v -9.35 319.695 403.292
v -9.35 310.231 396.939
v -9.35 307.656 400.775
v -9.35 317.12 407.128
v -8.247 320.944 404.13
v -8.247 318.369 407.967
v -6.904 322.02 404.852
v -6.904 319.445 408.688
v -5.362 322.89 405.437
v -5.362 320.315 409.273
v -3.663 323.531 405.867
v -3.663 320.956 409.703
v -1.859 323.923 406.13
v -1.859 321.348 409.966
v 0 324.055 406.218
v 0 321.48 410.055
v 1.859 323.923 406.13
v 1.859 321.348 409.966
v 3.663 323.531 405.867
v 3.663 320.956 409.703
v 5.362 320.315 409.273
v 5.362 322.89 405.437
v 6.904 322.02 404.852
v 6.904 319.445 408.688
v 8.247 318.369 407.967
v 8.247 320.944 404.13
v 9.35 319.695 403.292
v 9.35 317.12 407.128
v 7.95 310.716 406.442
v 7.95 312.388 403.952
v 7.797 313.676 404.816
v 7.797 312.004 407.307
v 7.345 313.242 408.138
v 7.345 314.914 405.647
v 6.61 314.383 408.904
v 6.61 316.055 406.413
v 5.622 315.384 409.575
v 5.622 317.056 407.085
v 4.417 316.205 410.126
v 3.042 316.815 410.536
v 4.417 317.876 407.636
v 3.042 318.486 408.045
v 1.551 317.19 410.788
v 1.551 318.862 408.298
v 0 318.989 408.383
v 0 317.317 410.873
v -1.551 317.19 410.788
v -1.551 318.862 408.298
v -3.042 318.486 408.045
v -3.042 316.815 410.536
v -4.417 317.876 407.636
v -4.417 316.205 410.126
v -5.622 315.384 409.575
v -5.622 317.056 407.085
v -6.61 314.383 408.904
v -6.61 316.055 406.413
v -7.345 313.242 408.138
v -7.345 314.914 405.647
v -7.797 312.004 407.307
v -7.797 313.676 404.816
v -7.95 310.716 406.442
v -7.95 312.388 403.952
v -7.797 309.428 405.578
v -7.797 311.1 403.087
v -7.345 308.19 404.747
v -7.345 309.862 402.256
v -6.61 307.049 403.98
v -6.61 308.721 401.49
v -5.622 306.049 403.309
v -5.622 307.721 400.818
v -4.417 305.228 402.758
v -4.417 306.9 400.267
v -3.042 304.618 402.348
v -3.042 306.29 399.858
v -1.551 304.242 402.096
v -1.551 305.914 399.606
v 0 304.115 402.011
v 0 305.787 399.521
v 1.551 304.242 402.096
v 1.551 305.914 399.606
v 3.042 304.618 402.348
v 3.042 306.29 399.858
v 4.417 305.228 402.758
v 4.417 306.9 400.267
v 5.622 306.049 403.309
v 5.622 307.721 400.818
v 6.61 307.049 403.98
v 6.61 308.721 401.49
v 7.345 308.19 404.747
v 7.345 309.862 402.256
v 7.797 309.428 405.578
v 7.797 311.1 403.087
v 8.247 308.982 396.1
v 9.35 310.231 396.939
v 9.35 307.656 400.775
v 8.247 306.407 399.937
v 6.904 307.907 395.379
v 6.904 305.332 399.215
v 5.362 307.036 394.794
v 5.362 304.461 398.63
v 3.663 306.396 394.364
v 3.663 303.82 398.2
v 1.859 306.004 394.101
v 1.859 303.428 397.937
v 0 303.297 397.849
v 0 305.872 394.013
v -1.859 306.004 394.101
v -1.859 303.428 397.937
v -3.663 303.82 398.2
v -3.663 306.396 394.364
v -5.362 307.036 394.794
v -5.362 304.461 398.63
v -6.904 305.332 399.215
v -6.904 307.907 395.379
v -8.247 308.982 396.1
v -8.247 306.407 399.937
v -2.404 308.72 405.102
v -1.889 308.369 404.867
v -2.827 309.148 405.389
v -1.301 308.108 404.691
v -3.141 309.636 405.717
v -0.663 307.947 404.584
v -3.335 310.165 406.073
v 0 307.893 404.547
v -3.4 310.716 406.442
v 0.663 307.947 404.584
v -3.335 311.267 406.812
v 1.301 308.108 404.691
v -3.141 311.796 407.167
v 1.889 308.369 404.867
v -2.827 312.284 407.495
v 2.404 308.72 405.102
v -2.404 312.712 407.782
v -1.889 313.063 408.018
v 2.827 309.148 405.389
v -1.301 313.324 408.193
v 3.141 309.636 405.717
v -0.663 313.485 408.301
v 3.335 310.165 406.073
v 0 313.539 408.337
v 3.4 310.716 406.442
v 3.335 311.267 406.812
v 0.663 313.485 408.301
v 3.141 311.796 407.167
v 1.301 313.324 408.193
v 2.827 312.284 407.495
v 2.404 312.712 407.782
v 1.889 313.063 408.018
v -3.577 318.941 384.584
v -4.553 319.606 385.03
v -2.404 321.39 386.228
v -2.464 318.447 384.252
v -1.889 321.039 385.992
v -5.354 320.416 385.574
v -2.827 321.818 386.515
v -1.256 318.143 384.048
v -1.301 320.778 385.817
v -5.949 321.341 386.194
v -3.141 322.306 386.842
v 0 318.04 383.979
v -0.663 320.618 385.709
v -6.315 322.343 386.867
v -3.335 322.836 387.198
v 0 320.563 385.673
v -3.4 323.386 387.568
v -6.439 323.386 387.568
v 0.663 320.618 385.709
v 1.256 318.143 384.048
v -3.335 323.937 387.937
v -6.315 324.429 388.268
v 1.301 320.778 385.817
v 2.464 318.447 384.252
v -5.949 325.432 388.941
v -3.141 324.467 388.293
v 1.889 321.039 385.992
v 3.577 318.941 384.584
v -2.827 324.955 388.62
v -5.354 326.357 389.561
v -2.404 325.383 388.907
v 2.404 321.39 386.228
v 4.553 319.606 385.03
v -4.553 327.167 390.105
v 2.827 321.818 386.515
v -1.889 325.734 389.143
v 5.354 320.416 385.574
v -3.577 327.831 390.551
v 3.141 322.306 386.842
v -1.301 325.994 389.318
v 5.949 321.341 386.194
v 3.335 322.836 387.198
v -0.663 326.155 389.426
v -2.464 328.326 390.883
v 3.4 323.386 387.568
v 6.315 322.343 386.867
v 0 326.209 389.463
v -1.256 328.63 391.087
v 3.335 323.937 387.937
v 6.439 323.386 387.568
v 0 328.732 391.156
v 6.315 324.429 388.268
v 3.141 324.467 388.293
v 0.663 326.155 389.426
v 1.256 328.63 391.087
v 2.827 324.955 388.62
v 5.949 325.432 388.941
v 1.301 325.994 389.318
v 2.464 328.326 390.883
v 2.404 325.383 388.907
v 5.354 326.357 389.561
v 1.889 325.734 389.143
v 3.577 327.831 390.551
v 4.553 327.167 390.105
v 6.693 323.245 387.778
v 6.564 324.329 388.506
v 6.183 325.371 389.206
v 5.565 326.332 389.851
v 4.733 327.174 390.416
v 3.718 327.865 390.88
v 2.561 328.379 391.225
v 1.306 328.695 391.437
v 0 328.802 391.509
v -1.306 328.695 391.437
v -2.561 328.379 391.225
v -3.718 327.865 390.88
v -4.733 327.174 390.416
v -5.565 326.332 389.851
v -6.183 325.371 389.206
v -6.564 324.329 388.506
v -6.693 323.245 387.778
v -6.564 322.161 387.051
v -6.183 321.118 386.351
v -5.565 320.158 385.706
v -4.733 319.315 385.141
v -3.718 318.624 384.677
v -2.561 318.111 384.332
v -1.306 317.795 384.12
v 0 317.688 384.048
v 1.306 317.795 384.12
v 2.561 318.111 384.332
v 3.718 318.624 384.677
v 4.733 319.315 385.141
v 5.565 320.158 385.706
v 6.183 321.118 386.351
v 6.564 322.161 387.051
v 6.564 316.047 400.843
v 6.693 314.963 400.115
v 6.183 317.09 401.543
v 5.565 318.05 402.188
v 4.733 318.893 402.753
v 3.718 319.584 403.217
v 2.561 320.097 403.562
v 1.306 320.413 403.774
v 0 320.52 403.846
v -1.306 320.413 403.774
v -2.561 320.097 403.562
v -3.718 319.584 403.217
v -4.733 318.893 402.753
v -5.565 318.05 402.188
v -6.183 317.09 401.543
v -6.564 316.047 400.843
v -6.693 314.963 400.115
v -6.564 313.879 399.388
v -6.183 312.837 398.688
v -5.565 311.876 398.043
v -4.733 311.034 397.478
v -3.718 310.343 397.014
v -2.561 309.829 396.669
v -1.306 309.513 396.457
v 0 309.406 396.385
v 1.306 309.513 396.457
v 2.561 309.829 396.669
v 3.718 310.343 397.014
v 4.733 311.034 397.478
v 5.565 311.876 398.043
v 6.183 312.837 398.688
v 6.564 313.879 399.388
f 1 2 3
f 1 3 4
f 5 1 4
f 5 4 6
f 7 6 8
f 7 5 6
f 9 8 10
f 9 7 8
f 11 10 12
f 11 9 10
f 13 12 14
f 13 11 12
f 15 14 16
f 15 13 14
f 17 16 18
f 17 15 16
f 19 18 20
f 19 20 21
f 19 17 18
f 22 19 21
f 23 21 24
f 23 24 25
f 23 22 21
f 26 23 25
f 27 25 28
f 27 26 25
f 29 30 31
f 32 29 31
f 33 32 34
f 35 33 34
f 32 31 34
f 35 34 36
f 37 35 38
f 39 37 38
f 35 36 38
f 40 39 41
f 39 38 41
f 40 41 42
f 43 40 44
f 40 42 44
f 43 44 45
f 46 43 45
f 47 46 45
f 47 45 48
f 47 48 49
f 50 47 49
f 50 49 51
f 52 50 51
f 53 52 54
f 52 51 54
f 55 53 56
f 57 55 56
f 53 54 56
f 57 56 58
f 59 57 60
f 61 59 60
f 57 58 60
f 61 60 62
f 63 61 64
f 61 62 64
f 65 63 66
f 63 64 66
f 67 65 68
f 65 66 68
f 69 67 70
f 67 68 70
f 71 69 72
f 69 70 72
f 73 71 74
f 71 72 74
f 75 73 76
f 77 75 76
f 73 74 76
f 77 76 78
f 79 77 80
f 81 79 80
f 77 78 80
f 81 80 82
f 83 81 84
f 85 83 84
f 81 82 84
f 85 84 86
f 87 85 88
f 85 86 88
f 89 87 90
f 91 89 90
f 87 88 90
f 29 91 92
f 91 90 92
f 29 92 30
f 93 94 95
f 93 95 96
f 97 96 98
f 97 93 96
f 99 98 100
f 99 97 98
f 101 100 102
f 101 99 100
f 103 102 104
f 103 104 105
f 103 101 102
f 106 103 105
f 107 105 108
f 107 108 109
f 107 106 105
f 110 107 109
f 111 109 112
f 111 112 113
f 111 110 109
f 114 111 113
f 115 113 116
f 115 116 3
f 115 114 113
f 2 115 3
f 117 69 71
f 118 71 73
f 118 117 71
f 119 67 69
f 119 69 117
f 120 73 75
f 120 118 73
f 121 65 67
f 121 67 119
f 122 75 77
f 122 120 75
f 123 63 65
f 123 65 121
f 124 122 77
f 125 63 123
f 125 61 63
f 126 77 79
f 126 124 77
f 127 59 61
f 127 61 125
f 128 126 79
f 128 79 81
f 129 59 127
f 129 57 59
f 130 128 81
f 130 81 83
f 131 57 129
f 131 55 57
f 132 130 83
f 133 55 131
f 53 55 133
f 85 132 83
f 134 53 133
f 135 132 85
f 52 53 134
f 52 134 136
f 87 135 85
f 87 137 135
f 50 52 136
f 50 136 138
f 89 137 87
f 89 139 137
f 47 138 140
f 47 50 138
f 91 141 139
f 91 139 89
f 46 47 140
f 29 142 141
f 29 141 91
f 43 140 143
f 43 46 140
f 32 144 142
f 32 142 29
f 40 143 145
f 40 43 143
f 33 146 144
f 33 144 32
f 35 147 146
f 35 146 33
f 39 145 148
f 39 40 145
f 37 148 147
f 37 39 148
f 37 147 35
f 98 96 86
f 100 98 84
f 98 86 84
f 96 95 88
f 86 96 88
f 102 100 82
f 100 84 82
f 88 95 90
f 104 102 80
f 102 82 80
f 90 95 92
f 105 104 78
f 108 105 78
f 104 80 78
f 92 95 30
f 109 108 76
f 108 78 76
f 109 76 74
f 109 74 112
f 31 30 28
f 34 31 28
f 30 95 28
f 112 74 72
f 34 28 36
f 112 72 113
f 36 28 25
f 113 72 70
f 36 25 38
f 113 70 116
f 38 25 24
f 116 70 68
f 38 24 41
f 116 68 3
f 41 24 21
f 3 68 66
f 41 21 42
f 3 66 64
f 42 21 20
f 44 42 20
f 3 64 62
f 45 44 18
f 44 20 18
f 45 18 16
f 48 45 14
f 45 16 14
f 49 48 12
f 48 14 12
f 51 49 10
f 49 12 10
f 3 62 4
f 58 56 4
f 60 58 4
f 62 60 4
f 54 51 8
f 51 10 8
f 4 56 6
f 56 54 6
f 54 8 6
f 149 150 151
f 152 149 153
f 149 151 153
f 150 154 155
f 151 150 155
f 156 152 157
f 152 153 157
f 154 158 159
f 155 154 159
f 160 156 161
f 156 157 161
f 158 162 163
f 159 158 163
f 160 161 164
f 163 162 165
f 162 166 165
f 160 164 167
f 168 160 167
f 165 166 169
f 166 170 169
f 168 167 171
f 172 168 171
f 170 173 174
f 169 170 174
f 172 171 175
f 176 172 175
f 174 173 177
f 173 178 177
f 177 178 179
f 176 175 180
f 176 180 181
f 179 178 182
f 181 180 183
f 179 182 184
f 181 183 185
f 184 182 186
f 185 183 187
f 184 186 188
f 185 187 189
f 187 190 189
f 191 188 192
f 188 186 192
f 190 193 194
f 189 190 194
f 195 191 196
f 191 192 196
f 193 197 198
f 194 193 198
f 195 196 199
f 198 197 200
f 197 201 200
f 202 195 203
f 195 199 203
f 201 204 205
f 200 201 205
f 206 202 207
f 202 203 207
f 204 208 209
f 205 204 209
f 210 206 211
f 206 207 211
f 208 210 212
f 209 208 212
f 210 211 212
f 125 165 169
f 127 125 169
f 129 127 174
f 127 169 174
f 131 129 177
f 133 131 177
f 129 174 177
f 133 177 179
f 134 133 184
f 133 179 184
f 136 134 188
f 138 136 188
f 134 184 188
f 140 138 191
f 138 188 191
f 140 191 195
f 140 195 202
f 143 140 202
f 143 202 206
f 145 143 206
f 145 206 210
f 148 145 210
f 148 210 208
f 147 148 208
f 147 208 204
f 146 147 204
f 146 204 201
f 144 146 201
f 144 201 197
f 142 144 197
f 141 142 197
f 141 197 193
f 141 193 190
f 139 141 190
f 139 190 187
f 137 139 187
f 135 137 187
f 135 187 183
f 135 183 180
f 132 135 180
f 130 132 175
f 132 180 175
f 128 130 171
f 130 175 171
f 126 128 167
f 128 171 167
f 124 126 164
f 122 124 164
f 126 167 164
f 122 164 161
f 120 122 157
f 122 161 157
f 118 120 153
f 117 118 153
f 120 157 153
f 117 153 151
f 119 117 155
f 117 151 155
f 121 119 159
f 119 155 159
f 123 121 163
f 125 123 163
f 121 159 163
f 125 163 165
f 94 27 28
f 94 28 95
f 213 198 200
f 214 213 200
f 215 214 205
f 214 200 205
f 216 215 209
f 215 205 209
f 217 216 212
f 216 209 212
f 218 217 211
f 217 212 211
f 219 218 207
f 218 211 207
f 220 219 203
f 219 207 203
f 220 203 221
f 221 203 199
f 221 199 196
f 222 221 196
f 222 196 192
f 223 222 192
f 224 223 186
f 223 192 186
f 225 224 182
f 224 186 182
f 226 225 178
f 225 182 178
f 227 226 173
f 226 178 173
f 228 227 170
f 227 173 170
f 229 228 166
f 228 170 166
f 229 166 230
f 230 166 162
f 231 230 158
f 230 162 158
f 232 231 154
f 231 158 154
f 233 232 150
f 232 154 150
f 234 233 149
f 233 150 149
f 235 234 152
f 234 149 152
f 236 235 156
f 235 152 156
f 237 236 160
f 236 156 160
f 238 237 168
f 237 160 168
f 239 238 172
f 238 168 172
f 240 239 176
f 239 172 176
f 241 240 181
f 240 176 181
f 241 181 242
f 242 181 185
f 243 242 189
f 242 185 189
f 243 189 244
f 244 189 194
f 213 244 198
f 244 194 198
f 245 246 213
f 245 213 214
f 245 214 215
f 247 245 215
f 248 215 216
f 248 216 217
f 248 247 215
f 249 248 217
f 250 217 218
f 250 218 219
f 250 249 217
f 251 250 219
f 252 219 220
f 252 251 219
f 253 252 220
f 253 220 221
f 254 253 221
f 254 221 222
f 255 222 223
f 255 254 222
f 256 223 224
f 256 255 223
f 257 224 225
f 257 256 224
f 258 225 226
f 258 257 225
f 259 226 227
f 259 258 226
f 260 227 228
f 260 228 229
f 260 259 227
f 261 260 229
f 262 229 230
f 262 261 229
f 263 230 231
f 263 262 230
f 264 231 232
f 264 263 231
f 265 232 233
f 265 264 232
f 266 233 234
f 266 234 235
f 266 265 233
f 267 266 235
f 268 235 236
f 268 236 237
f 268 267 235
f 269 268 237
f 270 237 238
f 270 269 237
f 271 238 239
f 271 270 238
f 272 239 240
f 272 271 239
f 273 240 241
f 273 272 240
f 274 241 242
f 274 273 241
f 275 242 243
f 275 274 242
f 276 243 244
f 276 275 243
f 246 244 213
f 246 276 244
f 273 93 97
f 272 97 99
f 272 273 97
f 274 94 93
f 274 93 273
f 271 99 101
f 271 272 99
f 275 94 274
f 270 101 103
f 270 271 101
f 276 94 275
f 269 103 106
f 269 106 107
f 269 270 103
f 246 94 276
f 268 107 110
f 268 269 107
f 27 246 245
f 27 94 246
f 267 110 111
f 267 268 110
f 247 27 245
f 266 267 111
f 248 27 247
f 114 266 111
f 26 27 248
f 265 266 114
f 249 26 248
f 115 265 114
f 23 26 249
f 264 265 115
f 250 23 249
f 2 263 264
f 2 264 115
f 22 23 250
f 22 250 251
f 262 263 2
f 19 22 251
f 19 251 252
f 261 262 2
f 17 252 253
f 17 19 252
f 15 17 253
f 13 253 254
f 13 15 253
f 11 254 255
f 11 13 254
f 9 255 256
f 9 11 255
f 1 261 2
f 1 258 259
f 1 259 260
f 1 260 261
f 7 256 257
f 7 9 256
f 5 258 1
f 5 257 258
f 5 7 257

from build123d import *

# Parameters (mm, degrees)
SKETCH2_R              = 6.6929
BOSS_EXTRUDE1_DEPTH    = 15.113
SKETCH3_R              = 6.6929
BOSS_EXTRUDE2_DEPTH    = 4.62026
SKETCH4_R              = 7.9502
BOSS_EXTRUDE3_DEPTH    = 2.99974
M8X1_25_TAPPED_HOLE1_D = 6.8
CHAMFER2_SIZE          = 0.254


with BuildPart() as part:
    # Sketch2 → Boss-Extrude1 (new body)
    with BuildSketch(Plane(origin=(0, -87.315503791, 130.072474606), x_dir=(1, 0, 0), z_dir=(0, -0.557351153, 0.830276877))):
        with Locations((0, 484.511457201)):
            Circle(SKETCH2_R)
    extrude(amount=-BOSS_EXTRUDE1_DEPTH)

    # Sketch3 → Boss-Extrude2 (add)
    with BuildSketch(Plane(origin=(0, -87.315503791, 130.072474606), x_dir=(1, 0, 0), z_dir=(0, -0.557351153, 0.830276877))):
        with BuildLine():
            Line((-9.34974, 478.812023199), (-9.34974, 490.210891202))
            ThreePointArc((-9.34974, 490.210891202), (0, 495.461397201), (9.34974, 490.210891202))
            Line((9.34974, 490.210891202), (9.34974, 478.812023199))
            ThreePointArc((9.34974, 478.812023199), (0, 473.561517201), (-9.34974, 478.812023199))
        make_face()
        with Locations((0, 484.511457201)):
            Circle(SKETCH3_R, mode=Mode.SUBTRACT)
        with Locations((0, 484.511457201)):
            Circle(SKETCH3_R)
    extrude(amount=BOSS_EXTRUDE2_DEPTH)

    # Sketch4 → Boss-Extrude3 (add)
    with BuildSketch(Plane(origin=(0, -89.890611031, 133.908569648), x_dir=(1, 0, 0), z_dir=(0, -0.557351153, 0.830276877))):
        with Locations((0, 484.511457201)):
            Circle(SKETCH4_R)
    extrude(amount=BOSS_EXTRUDE3_DEPTH)

    # M8x1.25 Tapped Hole1 (through all)
    with Locations(Plane(origin=(0, -91.56251958, 136.399184405), x_dir=(1, 0, 0), z_dir=(0, -0.557351153, 0.830276877))):
        with Locations((0, 484.511457201)):
            Hole(M8X1_25_TAPPED_HOLE1_D / 2)

    # Chamfer2
    chamfer2_edges = [part.edges().sort_by_distance(p)[0] for p in [
        (-6.6929, 323.386403518, 387.567519724),
    ]]
    chamfer(chamfer2_edges, length=CHAMFER2_SIZE)


solid = part.part
